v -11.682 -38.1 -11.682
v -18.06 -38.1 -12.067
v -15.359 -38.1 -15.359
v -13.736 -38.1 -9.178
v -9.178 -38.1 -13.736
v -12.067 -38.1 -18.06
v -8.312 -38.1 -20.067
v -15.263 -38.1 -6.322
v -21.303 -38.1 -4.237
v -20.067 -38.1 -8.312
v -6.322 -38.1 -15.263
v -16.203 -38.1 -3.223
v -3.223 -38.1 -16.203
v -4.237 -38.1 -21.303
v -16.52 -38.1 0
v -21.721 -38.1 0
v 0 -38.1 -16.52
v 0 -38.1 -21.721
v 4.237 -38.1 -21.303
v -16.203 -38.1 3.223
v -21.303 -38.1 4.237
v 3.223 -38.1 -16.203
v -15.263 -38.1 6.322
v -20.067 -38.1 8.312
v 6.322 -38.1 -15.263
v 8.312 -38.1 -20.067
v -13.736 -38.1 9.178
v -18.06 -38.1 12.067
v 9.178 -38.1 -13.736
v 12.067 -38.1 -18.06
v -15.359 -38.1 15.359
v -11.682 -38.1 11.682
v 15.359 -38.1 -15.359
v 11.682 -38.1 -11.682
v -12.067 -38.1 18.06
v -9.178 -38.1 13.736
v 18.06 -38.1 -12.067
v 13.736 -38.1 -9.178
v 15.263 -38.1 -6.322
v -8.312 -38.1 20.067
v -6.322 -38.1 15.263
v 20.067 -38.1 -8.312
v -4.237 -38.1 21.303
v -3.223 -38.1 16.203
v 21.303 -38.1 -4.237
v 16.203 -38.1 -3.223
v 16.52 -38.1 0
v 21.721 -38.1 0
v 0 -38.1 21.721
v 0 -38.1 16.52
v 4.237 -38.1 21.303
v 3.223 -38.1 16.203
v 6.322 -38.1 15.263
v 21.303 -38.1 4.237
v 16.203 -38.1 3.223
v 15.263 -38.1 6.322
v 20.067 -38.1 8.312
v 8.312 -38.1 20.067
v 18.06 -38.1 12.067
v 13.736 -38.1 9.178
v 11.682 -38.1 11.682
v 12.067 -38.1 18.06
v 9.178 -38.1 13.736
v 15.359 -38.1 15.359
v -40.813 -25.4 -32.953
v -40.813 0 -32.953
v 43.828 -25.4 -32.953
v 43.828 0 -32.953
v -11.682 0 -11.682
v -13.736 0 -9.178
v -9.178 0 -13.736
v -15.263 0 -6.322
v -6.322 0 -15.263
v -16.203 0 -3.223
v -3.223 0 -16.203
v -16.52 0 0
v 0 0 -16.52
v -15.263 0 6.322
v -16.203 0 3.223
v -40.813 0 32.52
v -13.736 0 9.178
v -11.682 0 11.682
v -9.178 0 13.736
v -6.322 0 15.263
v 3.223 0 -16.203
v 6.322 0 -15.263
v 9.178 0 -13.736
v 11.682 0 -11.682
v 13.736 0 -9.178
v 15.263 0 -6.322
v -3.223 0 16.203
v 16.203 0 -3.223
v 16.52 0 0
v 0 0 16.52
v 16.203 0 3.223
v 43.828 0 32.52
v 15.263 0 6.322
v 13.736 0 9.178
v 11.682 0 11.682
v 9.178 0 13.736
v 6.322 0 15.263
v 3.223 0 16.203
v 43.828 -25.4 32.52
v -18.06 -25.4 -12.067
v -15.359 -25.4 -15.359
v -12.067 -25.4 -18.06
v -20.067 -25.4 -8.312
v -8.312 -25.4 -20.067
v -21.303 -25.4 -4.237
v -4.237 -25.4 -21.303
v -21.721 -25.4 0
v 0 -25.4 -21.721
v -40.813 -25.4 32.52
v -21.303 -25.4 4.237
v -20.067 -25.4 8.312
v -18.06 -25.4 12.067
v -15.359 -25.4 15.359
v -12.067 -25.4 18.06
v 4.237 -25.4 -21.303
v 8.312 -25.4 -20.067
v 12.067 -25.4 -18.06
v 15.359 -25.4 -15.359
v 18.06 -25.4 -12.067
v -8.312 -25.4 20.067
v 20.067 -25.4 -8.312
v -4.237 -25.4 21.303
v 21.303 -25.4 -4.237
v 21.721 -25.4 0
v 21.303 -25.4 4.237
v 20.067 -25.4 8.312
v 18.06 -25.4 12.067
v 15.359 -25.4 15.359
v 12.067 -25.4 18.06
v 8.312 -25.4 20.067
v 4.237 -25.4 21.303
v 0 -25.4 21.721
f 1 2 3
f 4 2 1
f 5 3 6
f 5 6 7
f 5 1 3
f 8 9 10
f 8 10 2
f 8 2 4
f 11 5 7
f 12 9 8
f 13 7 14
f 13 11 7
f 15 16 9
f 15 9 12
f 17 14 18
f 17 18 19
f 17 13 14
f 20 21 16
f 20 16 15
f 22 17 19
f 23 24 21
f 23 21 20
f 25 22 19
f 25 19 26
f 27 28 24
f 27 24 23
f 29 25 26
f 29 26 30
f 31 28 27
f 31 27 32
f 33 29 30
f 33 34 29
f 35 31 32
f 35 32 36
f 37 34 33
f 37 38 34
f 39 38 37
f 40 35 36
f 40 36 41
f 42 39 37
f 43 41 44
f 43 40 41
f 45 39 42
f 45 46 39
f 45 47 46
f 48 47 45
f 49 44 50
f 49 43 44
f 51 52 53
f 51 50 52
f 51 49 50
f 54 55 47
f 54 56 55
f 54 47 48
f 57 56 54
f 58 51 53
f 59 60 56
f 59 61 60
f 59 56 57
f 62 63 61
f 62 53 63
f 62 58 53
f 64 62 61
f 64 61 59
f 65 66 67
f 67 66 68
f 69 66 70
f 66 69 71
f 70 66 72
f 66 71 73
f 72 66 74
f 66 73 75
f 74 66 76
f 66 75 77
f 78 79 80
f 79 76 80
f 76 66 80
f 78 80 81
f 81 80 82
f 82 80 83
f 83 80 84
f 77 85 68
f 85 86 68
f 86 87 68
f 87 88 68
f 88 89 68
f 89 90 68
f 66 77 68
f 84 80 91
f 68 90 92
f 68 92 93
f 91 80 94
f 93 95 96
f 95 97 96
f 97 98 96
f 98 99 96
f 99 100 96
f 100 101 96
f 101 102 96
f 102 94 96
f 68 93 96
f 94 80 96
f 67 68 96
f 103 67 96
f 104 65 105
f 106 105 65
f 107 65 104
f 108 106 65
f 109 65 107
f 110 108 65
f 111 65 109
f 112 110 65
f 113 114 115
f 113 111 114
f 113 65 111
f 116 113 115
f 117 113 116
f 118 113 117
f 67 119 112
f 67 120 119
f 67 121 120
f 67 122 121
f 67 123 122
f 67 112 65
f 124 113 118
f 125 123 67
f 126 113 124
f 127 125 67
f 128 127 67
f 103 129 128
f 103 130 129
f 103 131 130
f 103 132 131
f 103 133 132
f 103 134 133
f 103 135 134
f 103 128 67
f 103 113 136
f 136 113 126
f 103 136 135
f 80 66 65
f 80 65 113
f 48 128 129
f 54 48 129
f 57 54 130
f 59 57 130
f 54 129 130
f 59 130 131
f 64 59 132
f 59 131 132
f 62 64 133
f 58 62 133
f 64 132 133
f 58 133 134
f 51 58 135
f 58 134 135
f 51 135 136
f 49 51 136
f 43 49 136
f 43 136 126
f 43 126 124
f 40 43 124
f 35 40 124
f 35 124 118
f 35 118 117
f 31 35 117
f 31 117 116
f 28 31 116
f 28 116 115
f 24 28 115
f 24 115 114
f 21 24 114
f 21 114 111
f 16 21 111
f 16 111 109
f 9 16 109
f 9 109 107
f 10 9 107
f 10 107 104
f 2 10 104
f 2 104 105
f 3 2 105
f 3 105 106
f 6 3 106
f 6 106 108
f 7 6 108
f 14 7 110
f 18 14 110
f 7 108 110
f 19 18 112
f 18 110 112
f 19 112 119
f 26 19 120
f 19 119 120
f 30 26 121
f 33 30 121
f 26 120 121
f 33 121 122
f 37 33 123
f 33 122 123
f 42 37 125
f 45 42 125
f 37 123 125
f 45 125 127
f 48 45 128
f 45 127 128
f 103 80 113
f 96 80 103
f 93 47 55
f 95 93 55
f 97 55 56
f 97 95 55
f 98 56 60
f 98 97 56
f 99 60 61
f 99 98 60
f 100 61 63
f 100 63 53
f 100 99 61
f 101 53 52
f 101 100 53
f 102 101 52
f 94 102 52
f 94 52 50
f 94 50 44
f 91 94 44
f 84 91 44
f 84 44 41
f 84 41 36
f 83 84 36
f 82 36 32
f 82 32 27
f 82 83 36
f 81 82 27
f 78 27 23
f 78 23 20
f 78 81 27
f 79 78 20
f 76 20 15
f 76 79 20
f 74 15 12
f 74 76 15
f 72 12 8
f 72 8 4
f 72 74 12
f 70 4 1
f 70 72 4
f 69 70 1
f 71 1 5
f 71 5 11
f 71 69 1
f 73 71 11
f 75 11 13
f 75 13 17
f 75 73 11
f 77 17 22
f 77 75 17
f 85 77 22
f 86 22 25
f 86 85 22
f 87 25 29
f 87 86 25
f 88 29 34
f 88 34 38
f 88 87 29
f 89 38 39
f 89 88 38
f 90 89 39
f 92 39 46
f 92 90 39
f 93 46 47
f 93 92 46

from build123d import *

# Parameters (mm, degrees)
F0_R     = 21.720665
F0_R_2   = 16.520494
F1_DEPTH = 38.1
F0_W     = 84.640459
F0_H     = 65.472521
F2_DEPTH = 25.4


with BuildPart() as f1:
    # F0 (on Front) → F1 (new body)
    with BuildSketch(Plane.XZ):
        Circle(F0_R)
        Circle(F0_R_2, mode=Mode.SUBTRACT)
    extrude(amount=F1_DEPTH)

    # F0 (on Front) → F2 (join)
    with BuildSketch(Plane.XZ):
        with Locations((1.507592, -0.216593)):
            Rectangle(F0_W, F0_H)
        Circle(F0_R, mode=Mode.SUBTRACT)
    extrude(amount=F2_DEPTH)


solid = f1.part
